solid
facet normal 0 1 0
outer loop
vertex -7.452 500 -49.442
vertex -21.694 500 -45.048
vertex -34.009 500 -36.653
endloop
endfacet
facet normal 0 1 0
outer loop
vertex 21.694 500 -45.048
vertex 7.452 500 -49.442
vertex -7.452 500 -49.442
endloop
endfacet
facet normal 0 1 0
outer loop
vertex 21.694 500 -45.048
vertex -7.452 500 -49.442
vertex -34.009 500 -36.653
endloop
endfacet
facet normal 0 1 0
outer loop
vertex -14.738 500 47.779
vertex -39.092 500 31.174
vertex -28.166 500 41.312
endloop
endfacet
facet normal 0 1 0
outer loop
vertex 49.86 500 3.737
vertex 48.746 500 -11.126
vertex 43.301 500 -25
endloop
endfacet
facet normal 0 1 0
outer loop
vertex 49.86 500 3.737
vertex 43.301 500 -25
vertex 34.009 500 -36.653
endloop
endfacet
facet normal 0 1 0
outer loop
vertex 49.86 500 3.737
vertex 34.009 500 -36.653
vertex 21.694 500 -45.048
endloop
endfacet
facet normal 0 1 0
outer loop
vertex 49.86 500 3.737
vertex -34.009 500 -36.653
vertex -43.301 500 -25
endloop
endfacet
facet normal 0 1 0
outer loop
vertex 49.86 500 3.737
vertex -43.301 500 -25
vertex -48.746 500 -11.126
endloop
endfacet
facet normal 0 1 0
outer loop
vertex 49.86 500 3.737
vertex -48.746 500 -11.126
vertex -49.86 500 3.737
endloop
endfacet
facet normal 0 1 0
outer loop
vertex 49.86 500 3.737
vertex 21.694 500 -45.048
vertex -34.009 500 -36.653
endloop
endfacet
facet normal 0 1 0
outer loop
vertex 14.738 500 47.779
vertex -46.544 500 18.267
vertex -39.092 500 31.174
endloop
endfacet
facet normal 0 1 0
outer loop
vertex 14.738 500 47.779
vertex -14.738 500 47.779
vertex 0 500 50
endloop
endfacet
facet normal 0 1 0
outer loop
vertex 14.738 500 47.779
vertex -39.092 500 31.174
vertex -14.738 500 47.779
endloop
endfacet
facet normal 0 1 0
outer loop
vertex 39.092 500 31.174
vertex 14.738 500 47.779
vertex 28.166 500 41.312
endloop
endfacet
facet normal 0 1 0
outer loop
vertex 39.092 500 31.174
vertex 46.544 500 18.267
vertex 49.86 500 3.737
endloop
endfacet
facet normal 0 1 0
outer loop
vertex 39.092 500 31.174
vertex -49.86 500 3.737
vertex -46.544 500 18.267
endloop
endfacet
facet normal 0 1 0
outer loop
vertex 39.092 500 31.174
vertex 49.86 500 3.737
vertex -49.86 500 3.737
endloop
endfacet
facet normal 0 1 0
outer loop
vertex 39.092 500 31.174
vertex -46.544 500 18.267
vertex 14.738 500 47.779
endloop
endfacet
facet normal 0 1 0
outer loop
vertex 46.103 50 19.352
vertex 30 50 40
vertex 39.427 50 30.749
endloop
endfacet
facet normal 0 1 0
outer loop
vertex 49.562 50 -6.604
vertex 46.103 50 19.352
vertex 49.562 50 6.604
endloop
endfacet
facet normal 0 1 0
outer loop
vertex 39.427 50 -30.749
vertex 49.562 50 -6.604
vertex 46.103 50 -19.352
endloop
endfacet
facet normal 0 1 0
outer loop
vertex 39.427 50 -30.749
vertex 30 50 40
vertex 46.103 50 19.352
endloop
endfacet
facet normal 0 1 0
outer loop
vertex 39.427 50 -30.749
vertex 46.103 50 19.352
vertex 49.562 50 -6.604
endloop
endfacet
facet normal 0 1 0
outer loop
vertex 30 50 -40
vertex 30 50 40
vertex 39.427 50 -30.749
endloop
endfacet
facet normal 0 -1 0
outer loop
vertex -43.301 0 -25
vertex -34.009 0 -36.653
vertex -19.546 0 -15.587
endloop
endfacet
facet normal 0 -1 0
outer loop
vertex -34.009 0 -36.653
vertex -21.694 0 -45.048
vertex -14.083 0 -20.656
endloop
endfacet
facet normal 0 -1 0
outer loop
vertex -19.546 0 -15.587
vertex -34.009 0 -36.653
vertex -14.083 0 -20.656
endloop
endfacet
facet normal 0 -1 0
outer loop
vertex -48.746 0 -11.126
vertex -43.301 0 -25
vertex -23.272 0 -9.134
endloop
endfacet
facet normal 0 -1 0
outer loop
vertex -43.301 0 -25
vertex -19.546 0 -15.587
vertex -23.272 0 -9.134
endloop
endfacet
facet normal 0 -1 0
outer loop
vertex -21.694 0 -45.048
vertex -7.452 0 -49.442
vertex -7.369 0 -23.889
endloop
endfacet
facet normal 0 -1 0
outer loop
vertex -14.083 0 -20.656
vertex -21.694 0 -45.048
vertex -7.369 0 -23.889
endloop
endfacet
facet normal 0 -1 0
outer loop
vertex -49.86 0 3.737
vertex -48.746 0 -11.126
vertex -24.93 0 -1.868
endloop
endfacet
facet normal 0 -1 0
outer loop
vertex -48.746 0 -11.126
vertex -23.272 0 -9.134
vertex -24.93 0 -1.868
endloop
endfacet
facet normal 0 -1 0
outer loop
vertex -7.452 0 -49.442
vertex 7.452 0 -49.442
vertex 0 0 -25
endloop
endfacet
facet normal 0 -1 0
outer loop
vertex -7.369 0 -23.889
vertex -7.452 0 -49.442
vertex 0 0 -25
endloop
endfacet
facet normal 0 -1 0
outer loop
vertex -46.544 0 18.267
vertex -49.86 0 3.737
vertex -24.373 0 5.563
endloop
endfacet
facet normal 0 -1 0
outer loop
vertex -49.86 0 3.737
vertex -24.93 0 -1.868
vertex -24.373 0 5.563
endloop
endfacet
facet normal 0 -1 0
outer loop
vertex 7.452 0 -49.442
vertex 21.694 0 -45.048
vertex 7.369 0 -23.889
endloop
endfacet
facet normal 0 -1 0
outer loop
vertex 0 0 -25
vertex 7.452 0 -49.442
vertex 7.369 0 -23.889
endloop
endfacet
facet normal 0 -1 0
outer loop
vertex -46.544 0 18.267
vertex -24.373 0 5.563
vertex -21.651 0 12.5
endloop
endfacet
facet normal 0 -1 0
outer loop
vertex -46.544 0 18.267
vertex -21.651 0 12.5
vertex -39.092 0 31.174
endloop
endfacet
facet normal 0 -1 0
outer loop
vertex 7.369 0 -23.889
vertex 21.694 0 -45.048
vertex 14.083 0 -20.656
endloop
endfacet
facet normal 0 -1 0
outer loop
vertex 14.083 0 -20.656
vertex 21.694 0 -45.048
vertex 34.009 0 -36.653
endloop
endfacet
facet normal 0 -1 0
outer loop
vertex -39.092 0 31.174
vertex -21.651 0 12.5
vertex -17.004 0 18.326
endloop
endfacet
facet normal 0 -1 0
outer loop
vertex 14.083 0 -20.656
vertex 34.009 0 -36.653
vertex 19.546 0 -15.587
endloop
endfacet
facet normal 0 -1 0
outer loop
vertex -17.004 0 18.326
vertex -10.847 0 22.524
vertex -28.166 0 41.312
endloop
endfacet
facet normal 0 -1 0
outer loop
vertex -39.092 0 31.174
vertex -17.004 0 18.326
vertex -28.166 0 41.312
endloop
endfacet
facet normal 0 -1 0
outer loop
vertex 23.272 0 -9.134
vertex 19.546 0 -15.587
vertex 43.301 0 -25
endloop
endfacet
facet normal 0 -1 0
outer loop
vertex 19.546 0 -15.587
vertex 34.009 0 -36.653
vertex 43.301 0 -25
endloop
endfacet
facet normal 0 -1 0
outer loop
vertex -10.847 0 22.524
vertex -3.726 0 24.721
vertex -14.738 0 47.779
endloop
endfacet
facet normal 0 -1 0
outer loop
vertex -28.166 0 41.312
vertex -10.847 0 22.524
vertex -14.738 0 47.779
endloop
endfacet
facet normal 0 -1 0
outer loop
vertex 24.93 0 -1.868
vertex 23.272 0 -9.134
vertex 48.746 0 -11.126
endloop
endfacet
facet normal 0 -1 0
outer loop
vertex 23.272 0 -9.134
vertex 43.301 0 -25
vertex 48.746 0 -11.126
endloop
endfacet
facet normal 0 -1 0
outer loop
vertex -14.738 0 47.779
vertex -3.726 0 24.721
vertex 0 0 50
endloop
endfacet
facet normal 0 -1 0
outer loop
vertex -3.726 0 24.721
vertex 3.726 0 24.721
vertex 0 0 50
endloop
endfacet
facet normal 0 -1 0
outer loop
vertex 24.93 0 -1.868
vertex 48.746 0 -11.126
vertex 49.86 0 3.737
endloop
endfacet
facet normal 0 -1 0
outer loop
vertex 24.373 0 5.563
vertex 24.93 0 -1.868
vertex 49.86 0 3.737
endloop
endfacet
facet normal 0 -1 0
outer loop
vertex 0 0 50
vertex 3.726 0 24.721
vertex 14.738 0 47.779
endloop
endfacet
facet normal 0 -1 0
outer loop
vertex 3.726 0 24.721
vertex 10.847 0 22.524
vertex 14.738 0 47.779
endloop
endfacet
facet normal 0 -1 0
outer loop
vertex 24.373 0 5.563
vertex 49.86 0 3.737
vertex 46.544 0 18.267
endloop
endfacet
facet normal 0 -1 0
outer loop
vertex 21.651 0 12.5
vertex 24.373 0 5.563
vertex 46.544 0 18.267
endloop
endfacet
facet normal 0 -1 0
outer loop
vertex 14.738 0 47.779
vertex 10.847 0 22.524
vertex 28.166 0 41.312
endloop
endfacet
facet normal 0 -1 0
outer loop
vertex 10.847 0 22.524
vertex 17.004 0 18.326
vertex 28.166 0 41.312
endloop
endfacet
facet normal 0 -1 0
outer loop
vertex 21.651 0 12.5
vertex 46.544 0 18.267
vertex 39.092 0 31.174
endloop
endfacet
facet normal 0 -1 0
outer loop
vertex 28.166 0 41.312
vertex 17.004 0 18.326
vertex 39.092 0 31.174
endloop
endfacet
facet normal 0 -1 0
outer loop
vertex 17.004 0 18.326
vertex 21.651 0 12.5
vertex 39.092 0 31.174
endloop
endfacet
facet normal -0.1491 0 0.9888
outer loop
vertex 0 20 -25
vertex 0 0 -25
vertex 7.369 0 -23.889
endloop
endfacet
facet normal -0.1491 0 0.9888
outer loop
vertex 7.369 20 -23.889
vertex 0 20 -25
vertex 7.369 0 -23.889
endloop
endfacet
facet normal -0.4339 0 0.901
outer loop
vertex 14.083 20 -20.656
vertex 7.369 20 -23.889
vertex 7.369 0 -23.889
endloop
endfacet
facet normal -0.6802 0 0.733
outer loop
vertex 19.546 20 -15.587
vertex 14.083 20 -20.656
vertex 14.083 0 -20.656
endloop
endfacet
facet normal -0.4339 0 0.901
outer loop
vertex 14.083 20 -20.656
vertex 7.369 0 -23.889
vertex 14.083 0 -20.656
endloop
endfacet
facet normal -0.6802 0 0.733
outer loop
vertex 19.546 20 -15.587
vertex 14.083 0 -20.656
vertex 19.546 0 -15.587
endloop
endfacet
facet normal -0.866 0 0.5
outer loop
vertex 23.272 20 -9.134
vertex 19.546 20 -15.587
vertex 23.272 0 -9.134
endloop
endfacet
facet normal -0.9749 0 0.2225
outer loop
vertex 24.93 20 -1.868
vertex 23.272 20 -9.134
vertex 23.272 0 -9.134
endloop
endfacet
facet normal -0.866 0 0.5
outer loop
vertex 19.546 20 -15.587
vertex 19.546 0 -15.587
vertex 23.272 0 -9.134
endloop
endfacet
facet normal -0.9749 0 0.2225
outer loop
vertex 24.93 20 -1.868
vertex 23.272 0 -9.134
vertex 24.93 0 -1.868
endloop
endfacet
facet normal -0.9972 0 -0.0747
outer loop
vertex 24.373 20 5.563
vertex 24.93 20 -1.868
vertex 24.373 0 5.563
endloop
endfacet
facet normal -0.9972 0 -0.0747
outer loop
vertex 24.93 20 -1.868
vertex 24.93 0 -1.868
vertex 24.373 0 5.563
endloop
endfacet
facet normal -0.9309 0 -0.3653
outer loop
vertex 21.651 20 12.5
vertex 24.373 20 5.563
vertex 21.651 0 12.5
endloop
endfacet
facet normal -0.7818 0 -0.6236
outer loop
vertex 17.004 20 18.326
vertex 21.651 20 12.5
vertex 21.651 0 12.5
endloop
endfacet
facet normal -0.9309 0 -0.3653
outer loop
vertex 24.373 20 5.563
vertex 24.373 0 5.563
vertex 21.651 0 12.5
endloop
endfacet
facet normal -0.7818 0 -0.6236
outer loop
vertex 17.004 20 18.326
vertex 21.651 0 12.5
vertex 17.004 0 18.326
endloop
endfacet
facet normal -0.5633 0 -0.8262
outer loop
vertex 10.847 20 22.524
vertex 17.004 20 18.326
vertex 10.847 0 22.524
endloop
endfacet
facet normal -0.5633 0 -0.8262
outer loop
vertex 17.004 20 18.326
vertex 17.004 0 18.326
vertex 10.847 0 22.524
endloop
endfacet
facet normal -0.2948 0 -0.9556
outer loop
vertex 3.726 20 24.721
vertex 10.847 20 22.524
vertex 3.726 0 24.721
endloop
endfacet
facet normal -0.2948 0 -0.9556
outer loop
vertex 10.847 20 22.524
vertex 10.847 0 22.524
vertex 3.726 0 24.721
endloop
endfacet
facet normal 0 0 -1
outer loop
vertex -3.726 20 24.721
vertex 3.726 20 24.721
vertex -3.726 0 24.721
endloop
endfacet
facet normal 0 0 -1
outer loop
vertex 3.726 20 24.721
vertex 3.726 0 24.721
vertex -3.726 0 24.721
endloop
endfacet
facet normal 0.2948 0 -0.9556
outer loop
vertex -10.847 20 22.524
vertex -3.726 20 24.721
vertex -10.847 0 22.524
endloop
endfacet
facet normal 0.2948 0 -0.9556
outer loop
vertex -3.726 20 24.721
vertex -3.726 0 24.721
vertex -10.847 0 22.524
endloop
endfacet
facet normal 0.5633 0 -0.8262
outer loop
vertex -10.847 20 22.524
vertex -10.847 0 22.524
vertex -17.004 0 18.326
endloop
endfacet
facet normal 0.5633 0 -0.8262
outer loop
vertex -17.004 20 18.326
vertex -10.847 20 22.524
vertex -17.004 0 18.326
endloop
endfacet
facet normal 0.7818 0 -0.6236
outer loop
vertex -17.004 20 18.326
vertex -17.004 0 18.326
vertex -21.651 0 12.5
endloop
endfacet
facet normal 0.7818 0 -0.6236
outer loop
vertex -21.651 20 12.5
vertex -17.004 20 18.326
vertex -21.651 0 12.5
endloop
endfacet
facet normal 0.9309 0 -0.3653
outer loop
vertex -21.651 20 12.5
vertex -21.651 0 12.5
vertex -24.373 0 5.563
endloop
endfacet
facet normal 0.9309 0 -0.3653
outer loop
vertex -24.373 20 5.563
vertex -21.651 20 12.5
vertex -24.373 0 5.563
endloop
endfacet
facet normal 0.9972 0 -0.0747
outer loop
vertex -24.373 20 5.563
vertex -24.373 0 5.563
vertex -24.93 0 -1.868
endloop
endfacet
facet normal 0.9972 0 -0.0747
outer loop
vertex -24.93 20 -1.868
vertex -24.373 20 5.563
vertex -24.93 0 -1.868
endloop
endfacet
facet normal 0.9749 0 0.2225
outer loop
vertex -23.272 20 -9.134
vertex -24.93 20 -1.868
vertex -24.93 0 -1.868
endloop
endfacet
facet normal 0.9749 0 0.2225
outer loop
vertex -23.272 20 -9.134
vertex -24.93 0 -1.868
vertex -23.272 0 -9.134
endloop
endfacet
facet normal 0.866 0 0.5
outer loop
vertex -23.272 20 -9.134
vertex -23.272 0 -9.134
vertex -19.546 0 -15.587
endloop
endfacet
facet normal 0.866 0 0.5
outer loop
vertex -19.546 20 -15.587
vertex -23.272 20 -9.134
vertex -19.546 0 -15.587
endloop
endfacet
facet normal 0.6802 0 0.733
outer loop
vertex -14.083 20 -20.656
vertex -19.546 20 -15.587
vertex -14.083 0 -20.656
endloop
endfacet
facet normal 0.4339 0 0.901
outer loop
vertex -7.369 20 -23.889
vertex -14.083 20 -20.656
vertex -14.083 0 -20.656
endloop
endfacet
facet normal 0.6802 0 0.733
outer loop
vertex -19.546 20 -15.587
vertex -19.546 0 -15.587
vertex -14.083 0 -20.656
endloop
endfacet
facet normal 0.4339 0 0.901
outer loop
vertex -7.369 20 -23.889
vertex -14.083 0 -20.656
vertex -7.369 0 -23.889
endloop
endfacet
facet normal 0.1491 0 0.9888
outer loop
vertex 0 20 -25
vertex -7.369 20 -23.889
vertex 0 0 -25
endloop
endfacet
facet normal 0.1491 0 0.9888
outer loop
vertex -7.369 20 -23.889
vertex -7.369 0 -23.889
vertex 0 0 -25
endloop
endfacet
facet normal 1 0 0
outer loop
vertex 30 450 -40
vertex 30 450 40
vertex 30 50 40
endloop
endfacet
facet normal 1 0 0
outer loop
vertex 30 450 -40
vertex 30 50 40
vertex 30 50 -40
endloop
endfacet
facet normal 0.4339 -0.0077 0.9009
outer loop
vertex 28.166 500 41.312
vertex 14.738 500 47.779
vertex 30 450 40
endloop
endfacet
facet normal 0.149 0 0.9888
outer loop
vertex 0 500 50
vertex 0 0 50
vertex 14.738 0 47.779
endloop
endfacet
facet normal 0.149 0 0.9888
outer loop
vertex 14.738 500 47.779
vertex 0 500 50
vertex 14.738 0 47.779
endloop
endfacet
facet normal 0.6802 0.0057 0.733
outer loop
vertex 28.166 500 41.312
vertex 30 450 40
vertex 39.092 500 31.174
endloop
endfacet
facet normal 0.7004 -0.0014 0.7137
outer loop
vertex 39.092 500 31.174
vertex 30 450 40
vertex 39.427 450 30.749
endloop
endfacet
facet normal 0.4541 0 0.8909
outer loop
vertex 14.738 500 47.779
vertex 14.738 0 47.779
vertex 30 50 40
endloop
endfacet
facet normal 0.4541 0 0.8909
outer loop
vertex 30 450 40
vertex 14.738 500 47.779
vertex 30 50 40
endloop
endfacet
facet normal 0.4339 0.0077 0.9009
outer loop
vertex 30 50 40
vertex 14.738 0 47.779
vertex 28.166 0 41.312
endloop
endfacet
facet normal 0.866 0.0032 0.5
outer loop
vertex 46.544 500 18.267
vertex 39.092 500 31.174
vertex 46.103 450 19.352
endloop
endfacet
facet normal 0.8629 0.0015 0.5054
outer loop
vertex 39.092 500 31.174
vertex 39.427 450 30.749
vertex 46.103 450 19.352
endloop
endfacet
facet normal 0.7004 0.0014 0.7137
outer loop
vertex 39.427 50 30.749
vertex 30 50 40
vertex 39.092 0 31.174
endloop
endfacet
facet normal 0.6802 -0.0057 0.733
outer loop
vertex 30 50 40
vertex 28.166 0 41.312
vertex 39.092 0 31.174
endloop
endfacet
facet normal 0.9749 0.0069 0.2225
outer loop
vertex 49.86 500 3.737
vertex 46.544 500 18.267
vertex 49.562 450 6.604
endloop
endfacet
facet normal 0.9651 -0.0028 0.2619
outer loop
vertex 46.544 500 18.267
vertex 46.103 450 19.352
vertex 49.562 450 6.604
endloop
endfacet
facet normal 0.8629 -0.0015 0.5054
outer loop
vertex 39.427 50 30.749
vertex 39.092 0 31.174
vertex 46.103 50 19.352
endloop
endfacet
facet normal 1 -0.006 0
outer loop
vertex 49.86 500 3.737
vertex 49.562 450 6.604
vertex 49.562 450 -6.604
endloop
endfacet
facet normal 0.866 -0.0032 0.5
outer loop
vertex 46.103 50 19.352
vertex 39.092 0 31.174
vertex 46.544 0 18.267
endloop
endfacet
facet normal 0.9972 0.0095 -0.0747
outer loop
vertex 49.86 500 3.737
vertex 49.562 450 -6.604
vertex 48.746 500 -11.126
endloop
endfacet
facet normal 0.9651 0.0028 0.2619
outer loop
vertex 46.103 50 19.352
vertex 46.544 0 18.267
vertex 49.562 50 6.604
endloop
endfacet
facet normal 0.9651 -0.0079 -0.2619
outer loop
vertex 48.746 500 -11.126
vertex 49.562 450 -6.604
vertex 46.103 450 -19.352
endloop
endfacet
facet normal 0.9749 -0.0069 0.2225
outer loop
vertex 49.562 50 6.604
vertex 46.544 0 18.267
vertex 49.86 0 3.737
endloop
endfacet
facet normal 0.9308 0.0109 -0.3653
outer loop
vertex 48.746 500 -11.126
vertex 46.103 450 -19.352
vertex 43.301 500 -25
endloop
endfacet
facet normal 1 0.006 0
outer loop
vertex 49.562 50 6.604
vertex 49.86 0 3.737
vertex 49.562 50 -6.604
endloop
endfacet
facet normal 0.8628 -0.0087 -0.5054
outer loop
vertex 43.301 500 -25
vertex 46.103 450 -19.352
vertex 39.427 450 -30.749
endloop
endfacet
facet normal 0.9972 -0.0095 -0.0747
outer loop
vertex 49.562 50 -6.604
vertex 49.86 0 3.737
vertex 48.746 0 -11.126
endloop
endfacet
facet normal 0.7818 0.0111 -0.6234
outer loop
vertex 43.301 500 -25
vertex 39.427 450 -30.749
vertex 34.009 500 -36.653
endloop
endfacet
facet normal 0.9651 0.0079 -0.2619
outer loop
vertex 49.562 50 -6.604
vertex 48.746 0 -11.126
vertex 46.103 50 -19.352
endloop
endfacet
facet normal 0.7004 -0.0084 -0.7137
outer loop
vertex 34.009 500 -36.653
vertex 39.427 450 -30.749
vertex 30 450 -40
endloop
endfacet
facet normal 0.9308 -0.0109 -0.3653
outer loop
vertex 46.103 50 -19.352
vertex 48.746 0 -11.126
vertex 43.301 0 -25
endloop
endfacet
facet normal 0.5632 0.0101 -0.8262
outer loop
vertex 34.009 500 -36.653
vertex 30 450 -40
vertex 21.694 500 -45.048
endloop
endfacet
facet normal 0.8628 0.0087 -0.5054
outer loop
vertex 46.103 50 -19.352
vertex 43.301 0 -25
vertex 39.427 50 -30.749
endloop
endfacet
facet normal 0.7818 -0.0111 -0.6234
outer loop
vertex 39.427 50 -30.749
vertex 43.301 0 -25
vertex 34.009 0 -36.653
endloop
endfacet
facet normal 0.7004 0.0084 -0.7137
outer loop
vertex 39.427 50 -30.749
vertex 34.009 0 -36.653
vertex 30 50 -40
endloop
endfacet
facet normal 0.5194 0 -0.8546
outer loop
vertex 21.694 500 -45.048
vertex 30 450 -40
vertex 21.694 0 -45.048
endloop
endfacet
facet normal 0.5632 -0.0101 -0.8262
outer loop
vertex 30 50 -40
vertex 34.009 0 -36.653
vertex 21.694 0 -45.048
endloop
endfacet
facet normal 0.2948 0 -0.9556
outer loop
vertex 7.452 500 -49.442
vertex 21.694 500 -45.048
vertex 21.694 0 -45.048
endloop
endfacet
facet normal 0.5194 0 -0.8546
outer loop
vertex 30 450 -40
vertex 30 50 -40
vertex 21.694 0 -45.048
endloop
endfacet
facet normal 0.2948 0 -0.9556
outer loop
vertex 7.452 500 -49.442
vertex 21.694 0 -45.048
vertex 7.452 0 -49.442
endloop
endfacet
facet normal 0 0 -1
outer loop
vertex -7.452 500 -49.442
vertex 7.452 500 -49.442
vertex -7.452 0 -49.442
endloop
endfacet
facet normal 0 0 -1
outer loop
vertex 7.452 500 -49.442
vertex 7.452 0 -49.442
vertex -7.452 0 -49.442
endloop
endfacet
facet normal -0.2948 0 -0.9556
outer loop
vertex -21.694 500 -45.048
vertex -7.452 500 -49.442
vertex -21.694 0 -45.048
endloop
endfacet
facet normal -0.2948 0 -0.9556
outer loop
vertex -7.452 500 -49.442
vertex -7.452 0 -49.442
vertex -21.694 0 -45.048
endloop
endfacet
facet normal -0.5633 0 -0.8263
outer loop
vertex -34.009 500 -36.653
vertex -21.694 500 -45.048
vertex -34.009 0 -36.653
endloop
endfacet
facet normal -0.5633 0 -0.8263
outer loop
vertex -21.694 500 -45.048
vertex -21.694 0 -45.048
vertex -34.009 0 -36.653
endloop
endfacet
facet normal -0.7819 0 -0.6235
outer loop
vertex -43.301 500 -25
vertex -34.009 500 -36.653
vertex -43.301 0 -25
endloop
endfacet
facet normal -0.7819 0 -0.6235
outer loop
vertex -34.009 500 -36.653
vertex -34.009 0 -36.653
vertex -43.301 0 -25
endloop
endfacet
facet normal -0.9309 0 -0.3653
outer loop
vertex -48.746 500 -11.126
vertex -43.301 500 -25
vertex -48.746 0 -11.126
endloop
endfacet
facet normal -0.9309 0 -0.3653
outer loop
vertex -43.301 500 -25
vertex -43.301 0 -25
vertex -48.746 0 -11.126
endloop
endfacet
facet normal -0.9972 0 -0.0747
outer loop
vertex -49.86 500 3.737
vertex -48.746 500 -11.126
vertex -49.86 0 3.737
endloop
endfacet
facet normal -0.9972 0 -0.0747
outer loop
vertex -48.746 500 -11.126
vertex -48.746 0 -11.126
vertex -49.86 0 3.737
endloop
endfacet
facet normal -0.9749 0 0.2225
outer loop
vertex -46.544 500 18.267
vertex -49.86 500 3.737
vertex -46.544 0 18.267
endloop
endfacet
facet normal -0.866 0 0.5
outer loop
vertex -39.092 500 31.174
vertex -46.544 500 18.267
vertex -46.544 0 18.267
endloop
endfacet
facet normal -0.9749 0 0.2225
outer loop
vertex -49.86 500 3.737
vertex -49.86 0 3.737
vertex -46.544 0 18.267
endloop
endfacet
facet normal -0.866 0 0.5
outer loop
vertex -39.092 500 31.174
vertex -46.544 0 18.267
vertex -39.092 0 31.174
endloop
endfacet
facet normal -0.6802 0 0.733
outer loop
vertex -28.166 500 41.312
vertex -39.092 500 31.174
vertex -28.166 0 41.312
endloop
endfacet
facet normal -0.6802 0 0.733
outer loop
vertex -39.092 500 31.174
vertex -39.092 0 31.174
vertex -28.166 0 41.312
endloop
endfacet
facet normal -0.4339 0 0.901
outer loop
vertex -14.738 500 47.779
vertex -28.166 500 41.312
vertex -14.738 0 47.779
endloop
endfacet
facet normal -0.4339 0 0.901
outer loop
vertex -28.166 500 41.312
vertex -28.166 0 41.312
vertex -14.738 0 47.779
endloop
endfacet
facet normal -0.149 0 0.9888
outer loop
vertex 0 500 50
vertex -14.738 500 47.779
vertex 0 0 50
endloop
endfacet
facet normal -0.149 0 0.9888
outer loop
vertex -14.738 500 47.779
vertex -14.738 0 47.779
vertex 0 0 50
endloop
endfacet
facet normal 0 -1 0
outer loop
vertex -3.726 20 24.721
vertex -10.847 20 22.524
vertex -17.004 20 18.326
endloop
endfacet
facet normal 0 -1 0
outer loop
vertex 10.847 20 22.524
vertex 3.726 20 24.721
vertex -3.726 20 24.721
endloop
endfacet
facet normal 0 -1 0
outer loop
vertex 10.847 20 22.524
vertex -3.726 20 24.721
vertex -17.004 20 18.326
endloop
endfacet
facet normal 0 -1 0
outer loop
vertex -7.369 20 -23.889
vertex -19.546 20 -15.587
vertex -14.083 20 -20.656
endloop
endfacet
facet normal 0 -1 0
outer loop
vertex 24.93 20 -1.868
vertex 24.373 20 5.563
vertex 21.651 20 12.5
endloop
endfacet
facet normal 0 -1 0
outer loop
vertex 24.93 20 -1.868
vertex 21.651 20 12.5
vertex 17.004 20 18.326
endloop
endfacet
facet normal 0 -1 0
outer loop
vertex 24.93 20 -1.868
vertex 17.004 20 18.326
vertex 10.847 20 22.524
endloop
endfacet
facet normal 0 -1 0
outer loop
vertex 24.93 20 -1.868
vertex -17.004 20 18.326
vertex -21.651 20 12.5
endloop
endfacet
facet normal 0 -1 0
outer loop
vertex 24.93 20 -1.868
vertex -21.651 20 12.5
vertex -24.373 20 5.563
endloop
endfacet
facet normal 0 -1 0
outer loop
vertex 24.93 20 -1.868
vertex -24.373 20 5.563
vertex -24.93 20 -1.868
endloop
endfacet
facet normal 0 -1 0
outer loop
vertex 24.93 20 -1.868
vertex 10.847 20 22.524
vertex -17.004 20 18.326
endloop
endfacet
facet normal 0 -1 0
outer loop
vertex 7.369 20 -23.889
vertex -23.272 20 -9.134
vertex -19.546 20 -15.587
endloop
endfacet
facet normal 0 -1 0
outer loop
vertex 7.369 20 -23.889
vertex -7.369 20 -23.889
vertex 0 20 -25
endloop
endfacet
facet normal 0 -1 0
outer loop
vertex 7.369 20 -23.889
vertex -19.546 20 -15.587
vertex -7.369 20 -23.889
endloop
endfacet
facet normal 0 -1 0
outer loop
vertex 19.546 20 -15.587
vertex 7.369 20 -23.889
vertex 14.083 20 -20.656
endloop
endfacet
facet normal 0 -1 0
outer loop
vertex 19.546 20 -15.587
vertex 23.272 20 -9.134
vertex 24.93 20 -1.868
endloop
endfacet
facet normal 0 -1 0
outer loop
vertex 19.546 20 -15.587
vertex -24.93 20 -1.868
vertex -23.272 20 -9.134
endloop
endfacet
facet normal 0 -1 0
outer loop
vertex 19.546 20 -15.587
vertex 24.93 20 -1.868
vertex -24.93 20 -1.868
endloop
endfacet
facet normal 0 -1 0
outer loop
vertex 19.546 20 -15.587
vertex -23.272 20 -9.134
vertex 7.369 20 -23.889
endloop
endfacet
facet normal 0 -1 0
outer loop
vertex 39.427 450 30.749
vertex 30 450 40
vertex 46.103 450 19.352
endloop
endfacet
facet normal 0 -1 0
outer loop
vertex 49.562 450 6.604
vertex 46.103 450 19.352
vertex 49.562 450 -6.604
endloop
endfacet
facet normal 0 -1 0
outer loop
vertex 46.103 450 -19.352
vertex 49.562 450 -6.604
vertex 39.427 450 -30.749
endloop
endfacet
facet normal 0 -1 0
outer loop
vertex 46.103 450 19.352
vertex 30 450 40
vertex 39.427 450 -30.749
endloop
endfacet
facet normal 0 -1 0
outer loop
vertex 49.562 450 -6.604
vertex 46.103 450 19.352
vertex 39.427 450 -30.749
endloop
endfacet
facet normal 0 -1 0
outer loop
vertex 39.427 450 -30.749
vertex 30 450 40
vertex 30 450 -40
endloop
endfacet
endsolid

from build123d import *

# Parameters (mm, degrees)
SKETCH1_R           = 50
BOSS_EXTRUDE1_DEPTH = 500
SKETCH2_R           = 25
CUT_EXTRUDE1_DEPTH  = 20
SKETCH3_W           = 200
SKETCH3_H           = 400
CUT_EXTRUDE2_DEPTH  = 50


with BuildPart() as part:
    # Sketch1 → Boss-Extrude1 (new body)
    with BuildSketch(Plane(origin=(0, 0, 0), x_dir=(1, 0, 0), z_dir=(0, 1, 0))):
        with Locations(Location((0, 0, 0), (0, 0, 270))):
            Circle(SKETCH1_R)
    extrude(amount=BOSS_EXTRUDE1_DEPTH)

    # Sketch2 → Cut-Extrude1 (cut)
    with BuildSketch(Plane.XZ):
        with Locations(Location((0, 0, 0), (0, 0, 270))):
            Circle(SKETCH2_R)
    extrude(amount=-CUT_EXTRUDE1_DEPTH, mode=Mode.SUBTRACT)

    # Sketch3 → Cut-Extrude2 (cut)
    with BuildSketch(Plane(origin=(30, 0, 0), x_dir=(0, 0, -1), z_dir=(1, 0, 0))):
        with Locations((0, 250)):
            Rectangle(SKETCH3_W, SKETCH3_H)
    extrude(amount=CUT_EXTRUDE2_DEPTH, mode=Mode.SUBTRACT)


solid = part.part
